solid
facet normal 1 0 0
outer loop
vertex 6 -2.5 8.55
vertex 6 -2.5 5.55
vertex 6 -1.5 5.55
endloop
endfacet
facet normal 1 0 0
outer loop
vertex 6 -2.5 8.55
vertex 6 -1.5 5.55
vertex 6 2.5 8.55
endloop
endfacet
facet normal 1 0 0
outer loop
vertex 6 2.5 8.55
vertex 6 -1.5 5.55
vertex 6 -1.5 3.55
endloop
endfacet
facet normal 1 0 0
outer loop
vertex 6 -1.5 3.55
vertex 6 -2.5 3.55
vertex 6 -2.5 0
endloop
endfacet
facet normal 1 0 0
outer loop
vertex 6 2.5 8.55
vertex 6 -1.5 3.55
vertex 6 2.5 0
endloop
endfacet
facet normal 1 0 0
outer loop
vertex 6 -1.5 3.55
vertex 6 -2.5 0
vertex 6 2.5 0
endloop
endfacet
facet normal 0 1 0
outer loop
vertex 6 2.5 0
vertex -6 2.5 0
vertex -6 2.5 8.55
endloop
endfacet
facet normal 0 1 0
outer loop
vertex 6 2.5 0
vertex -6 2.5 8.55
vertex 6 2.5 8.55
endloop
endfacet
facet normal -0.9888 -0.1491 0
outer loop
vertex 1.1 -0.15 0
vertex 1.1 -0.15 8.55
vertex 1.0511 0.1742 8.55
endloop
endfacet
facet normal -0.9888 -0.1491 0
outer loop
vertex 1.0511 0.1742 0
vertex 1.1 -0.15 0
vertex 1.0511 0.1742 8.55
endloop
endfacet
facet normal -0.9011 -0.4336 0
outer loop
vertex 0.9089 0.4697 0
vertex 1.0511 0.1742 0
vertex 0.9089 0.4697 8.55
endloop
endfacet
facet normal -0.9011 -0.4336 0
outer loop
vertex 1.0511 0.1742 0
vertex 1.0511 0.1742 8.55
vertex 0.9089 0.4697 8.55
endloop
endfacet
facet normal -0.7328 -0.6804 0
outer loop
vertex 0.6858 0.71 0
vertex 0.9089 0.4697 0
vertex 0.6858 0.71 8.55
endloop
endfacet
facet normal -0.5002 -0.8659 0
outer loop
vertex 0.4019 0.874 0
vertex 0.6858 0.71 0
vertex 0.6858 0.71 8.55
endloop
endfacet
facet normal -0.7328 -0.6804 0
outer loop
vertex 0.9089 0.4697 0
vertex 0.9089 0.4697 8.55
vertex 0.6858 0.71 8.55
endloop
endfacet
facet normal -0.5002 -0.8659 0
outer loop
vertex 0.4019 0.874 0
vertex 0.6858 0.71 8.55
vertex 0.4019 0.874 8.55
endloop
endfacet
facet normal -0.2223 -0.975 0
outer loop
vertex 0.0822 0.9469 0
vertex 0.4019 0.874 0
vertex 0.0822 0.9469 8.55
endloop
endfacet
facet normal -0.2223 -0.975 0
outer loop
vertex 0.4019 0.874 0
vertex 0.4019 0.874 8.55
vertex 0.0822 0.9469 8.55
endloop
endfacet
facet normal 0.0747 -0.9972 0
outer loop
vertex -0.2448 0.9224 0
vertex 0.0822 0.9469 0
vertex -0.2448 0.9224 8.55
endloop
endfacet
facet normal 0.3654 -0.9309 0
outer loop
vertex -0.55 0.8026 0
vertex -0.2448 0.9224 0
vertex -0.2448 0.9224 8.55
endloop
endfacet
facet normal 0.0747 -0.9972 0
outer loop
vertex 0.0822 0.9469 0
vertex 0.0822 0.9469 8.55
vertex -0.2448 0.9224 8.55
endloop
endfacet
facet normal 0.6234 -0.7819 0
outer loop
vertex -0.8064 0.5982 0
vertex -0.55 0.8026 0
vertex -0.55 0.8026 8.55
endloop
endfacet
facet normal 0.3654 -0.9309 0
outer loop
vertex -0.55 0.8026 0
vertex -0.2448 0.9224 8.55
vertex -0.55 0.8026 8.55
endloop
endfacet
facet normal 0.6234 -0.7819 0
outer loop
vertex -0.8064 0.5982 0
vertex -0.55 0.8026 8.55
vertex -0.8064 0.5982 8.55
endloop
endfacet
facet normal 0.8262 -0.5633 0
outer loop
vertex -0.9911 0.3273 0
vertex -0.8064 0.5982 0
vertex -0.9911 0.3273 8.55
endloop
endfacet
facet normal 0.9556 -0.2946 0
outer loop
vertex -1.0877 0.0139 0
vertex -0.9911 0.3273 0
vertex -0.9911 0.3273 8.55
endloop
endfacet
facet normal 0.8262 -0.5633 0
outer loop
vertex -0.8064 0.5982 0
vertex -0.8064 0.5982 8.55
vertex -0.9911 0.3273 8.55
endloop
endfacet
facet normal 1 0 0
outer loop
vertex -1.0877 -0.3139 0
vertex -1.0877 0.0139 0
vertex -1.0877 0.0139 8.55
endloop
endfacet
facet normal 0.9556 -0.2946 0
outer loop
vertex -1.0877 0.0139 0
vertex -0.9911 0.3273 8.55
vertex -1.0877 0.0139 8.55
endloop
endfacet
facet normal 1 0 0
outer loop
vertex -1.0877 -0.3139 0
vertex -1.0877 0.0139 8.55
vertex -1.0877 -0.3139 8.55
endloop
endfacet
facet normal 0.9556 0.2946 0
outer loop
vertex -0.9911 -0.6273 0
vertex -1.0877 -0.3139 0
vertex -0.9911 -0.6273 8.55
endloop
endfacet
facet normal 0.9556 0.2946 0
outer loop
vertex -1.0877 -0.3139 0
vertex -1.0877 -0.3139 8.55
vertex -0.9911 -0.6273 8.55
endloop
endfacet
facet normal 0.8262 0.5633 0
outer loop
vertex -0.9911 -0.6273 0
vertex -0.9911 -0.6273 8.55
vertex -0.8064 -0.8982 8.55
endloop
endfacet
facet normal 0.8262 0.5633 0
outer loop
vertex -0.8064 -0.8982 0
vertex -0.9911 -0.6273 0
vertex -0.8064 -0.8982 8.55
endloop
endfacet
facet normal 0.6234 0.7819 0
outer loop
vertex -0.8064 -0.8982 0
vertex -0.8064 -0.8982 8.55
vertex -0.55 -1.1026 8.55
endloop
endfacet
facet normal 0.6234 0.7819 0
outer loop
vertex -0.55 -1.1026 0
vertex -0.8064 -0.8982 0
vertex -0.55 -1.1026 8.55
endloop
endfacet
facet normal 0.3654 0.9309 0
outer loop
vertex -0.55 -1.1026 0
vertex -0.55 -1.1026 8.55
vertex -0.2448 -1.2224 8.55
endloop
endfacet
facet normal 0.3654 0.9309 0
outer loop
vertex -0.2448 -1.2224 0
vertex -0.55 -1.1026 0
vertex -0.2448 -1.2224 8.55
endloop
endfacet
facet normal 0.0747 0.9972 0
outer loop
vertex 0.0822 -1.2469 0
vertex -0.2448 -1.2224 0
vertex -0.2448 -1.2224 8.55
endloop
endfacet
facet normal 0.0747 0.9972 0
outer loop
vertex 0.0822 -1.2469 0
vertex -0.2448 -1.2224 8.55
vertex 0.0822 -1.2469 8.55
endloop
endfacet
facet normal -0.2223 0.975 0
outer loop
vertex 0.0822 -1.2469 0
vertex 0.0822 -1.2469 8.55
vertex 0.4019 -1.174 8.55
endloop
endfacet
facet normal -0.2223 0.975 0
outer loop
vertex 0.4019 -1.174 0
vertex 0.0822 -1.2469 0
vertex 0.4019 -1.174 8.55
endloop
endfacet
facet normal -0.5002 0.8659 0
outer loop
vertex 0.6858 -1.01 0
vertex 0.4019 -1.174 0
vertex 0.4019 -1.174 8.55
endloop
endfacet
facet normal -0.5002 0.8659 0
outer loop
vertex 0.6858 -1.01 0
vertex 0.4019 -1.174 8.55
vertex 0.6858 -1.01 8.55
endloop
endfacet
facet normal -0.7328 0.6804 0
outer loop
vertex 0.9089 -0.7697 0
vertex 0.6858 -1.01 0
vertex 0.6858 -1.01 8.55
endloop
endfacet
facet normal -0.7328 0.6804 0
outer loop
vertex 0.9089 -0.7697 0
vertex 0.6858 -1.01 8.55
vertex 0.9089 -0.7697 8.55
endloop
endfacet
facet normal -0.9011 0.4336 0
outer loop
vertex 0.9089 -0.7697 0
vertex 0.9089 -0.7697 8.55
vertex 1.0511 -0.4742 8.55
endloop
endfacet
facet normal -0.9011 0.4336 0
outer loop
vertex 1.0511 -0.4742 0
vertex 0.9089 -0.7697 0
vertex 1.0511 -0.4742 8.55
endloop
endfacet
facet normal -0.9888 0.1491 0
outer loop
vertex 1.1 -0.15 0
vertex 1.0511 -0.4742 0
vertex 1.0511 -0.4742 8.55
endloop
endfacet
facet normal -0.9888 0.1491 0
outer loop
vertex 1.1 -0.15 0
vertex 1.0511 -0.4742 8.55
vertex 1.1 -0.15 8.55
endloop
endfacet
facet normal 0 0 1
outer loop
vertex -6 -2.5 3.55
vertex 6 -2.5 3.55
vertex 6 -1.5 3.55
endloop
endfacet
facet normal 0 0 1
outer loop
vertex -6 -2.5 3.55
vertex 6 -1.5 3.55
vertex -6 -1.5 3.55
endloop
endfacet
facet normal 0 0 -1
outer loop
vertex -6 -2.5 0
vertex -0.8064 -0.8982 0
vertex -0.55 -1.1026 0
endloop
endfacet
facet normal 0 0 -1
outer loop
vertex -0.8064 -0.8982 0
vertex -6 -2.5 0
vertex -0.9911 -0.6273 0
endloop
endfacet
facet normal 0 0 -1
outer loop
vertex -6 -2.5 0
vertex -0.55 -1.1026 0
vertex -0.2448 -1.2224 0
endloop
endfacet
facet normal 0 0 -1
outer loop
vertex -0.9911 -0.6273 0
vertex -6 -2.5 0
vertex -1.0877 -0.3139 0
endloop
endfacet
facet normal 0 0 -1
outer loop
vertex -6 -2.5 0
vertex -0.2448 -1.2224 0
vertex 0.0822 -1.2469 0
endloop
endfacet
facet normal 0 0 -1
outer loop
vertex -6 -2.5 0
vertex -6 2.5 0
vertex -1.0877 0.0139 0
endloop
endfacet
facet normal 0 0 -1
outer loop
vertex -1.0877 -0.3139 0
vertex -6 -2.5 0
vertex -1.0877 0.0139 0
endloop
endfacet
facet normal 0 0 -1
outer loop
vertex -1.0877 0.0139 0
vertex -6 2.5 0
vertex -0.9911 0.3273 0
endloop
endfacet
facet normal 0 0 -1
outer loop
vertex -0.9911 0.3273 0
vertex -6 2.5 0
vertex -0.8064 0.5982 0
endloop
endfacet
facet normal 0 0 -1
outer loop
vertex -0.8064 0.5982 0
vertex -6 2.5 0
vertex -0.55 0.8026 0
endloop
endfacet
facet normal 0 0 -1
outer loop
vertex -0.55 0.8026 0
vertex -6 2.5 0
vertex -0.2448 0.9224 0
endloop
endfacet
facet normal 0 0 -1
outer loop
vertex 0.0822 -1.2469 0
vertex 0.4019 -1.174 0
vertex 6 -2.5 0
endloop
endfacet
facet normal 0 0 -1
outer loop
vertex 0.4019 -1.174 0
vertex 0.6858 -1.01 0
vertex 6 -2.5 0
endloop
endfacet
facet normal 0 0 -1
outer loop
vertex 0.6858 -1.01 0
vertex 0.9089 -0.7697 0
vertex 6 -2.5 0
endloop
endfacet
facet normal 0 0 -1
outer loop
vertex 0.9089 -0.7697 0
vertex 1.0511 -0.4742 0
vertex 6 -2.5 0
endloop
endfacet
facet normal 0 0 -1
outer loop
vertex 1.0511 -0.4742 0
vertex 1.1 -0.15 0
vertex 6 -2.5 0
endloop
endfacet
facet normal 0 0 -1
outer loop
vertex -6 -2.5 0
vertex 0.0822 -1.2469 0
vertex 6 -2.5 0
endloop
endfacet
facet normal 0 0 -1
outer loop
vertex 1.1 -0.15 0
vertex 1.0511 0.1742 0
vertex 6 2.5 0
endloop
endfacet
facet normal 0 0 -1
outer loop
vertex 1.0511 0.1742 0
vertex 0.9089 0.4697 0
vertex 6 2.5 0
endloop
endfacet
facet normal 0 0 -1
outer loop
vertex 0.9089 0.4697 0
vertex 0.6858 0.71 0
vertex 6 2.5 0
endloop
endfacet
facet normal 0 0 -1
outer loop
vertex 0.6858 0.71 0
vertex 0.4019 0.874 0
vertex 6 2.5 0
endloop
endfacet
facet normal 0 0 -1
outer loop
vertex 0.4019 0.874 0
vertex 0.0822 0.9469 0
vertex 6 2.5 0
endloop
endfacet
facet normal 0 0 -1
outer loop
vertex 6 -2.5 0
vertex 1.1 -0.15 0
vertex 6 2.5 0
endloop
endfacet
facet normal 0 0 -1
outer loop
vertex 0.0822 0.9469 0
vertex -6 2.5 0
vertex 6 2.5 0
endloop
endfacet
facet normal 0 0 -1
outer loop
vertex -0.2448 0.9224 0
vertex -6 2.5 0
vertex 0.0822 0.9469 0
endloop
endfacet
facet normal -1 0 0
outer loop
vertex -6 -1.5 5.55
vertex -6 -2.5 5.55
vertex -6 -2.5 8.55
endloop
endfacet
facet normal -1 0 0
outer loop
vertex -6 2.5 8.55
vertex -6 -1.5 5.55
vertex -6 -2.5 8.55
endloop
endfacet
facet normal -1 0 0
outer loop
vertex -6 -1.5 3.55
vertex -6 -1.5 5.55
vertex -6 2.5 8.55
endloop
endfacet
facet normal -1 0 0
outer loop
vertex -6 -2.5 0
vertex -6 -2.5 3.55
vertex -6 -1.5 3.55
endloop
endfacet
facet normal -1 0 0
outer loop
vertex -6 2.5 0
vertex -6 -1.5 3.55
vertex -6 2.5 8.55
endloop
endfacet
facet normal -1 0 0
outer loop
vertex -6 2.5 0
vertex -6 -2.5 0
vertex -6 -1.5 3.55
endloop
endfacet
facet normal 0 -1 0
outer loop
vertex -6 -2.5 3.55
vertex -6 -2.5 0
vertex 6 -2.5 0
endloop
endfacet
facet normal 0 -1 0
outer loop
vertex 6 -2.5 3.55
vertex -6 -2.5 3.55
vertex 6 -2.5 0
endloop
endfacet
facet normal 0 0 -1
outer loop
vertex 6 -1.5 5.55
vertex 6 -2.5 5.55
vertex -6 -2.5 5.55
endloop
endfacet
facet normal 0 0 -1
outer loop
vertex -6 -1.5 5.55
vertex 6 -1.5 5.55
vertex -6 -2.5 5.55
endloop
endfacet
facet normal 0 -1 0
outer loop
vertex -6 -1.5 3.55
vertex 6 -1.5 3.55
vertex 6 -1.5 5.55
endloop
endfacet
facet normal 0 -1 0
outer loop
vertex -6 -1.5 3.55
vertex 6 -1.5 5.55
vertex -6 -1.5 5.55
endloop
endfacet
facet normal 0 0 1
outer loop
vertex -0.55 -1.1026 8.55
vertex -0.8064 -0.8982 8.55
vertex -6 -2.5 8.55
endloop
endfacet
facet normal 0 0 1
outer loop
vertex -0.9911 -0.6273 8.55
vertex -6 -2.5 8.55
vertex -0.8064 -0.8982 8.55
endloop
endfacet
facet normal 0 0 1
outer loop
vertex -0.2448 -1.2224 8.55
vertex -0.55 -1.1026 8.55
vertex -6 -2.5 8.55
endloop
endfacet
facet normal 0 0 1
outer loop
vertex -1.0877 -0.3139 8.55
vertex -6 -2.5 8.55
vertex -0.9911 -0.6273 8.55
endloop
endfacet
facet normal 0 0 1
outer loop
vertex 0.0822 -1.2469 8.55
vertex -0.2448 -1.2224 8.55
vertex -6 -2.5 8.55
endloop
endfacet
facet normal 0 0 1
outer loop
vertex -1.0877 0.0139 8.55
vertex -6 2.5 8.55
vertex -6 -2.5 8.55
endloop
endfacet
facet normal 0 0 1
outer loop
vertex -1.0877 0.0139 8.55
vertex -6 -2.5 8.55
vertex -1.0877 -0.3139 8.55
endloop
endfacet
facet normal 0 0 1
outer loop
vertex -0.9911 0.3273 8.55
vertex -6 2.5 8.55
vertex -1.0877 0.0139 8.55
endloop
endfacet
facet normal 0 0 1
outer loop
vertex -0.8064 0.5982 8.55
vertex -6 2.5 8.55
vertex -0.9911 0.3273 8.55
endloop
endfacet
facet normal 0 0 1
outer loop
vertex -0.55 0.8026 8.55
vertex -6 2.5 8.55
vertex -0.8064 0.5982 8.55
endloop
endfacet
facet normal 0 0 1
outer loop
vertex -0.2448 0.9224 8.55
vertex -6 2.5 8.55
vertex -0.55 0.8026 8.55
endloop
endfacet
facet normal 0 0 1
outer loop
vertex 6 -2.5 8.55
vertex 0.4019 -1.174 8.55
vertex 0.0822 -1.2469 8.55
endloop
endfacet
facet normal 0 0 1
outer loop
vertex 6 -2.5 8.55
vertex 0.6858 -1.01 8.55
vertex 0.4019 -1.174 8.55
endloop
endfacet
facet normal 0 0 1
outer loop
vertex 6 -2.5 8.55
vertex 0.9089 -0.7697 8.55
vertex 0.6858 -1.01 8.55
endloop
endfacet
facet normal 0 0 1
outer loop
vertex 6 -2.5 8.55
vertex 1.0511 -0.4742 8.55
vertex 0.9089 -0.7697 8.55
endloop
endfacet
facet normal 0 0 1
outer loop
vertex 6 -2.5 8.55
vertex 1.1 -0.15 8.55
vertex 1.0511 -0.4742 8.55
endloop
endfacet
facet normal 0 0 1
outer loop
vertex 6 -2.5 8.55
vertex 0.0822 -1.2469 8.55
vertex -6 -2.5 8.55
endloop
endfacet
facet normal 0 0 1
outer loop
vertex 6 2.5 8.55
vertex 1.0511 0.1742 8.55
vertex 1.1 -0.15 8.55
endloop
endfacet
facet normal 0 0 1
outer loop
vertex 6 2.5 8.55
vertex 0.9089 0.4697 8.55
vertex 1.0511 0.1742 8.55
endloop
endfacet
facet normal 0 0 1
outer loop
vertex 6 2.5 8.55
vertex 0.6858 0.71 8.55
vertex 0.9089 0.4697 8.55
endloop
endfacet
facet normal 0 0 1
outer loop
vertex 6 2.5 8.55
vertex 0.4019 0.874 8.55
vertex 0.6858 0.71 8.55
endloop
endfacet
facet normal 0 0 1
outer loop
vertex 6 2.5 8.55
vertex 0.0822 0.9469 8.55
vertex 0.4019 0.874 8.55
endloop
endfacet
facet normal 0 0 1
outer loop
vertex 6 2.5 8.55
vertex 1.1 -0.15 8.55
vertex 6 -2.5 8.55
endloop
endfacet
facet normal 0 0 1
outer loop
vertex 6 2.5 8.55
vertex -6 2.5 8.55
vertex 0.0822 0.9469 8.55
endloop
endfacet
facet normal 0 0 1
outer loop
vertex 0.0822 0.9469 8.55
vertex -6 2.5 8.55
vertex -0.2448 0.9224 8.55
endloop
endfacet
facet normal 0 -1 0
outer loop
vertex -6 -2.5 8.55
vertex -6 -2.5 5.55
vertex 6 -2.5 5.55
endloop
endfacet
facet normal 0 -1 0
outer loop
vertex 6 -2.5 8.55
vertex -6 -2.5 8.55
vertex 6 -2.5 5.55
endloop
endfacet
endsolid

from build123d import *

# Parameters (mm, degrees)
SZKIC1_W                    = 12
SZKIC1_H                    = 5
DODANIE_WYCI_GNI_CIE1_DEPTH = 8.55
SZKIC2_R                    = 1.1
WYTNIJ_WYCI_GNI_CIE1_DEPTH  = 9.55
SZKIC3_W                    = 12
SZKIC3_H                    = 2
WYTNIJ_WYCI_GNI_CIE2_DEPTH  = 1


with BuildPart() as part:
    # Szkic1 → Dodanie-wyciągnięcie1 (new body)
    with BuildSketch(Plane.XY):
        Rectangle(SZKIC1_W, SZKIC1_H)
    extrude(amount=DODANIE_WYCI_GNI_CIE1_DEPTH)

    # Szkic2 → Wytnij-wyciągnięcie1 (cut, through all)
    with BuildSketch(Plane.XY.offset(8.55)):
        with Locations((0, -0.15)):
            Circle(SZKIC2_R)
    extrude(amount=-WYTNIJ_WYCI_GNI_CIE1_DEPTH, mode=Mode.SUBTRACT)

    # Szkic3 → Wytnij-wyciągnięcie2 (cut)
    with BuildSketch(Plane(origin=(0, -2.5, 0), x_dir=(-1, 0, 0), z_dir=(0, -1, 0))):
        with Locations((0, -4.55)):
            Rectangle(SZKIC3_W, SZKIC3_H)
    extrude(amount=-WYTNIJ_WYCI_GNI_CIE2_DEPTH, mode=Mode.SUBTRACT)


solid = part.part
